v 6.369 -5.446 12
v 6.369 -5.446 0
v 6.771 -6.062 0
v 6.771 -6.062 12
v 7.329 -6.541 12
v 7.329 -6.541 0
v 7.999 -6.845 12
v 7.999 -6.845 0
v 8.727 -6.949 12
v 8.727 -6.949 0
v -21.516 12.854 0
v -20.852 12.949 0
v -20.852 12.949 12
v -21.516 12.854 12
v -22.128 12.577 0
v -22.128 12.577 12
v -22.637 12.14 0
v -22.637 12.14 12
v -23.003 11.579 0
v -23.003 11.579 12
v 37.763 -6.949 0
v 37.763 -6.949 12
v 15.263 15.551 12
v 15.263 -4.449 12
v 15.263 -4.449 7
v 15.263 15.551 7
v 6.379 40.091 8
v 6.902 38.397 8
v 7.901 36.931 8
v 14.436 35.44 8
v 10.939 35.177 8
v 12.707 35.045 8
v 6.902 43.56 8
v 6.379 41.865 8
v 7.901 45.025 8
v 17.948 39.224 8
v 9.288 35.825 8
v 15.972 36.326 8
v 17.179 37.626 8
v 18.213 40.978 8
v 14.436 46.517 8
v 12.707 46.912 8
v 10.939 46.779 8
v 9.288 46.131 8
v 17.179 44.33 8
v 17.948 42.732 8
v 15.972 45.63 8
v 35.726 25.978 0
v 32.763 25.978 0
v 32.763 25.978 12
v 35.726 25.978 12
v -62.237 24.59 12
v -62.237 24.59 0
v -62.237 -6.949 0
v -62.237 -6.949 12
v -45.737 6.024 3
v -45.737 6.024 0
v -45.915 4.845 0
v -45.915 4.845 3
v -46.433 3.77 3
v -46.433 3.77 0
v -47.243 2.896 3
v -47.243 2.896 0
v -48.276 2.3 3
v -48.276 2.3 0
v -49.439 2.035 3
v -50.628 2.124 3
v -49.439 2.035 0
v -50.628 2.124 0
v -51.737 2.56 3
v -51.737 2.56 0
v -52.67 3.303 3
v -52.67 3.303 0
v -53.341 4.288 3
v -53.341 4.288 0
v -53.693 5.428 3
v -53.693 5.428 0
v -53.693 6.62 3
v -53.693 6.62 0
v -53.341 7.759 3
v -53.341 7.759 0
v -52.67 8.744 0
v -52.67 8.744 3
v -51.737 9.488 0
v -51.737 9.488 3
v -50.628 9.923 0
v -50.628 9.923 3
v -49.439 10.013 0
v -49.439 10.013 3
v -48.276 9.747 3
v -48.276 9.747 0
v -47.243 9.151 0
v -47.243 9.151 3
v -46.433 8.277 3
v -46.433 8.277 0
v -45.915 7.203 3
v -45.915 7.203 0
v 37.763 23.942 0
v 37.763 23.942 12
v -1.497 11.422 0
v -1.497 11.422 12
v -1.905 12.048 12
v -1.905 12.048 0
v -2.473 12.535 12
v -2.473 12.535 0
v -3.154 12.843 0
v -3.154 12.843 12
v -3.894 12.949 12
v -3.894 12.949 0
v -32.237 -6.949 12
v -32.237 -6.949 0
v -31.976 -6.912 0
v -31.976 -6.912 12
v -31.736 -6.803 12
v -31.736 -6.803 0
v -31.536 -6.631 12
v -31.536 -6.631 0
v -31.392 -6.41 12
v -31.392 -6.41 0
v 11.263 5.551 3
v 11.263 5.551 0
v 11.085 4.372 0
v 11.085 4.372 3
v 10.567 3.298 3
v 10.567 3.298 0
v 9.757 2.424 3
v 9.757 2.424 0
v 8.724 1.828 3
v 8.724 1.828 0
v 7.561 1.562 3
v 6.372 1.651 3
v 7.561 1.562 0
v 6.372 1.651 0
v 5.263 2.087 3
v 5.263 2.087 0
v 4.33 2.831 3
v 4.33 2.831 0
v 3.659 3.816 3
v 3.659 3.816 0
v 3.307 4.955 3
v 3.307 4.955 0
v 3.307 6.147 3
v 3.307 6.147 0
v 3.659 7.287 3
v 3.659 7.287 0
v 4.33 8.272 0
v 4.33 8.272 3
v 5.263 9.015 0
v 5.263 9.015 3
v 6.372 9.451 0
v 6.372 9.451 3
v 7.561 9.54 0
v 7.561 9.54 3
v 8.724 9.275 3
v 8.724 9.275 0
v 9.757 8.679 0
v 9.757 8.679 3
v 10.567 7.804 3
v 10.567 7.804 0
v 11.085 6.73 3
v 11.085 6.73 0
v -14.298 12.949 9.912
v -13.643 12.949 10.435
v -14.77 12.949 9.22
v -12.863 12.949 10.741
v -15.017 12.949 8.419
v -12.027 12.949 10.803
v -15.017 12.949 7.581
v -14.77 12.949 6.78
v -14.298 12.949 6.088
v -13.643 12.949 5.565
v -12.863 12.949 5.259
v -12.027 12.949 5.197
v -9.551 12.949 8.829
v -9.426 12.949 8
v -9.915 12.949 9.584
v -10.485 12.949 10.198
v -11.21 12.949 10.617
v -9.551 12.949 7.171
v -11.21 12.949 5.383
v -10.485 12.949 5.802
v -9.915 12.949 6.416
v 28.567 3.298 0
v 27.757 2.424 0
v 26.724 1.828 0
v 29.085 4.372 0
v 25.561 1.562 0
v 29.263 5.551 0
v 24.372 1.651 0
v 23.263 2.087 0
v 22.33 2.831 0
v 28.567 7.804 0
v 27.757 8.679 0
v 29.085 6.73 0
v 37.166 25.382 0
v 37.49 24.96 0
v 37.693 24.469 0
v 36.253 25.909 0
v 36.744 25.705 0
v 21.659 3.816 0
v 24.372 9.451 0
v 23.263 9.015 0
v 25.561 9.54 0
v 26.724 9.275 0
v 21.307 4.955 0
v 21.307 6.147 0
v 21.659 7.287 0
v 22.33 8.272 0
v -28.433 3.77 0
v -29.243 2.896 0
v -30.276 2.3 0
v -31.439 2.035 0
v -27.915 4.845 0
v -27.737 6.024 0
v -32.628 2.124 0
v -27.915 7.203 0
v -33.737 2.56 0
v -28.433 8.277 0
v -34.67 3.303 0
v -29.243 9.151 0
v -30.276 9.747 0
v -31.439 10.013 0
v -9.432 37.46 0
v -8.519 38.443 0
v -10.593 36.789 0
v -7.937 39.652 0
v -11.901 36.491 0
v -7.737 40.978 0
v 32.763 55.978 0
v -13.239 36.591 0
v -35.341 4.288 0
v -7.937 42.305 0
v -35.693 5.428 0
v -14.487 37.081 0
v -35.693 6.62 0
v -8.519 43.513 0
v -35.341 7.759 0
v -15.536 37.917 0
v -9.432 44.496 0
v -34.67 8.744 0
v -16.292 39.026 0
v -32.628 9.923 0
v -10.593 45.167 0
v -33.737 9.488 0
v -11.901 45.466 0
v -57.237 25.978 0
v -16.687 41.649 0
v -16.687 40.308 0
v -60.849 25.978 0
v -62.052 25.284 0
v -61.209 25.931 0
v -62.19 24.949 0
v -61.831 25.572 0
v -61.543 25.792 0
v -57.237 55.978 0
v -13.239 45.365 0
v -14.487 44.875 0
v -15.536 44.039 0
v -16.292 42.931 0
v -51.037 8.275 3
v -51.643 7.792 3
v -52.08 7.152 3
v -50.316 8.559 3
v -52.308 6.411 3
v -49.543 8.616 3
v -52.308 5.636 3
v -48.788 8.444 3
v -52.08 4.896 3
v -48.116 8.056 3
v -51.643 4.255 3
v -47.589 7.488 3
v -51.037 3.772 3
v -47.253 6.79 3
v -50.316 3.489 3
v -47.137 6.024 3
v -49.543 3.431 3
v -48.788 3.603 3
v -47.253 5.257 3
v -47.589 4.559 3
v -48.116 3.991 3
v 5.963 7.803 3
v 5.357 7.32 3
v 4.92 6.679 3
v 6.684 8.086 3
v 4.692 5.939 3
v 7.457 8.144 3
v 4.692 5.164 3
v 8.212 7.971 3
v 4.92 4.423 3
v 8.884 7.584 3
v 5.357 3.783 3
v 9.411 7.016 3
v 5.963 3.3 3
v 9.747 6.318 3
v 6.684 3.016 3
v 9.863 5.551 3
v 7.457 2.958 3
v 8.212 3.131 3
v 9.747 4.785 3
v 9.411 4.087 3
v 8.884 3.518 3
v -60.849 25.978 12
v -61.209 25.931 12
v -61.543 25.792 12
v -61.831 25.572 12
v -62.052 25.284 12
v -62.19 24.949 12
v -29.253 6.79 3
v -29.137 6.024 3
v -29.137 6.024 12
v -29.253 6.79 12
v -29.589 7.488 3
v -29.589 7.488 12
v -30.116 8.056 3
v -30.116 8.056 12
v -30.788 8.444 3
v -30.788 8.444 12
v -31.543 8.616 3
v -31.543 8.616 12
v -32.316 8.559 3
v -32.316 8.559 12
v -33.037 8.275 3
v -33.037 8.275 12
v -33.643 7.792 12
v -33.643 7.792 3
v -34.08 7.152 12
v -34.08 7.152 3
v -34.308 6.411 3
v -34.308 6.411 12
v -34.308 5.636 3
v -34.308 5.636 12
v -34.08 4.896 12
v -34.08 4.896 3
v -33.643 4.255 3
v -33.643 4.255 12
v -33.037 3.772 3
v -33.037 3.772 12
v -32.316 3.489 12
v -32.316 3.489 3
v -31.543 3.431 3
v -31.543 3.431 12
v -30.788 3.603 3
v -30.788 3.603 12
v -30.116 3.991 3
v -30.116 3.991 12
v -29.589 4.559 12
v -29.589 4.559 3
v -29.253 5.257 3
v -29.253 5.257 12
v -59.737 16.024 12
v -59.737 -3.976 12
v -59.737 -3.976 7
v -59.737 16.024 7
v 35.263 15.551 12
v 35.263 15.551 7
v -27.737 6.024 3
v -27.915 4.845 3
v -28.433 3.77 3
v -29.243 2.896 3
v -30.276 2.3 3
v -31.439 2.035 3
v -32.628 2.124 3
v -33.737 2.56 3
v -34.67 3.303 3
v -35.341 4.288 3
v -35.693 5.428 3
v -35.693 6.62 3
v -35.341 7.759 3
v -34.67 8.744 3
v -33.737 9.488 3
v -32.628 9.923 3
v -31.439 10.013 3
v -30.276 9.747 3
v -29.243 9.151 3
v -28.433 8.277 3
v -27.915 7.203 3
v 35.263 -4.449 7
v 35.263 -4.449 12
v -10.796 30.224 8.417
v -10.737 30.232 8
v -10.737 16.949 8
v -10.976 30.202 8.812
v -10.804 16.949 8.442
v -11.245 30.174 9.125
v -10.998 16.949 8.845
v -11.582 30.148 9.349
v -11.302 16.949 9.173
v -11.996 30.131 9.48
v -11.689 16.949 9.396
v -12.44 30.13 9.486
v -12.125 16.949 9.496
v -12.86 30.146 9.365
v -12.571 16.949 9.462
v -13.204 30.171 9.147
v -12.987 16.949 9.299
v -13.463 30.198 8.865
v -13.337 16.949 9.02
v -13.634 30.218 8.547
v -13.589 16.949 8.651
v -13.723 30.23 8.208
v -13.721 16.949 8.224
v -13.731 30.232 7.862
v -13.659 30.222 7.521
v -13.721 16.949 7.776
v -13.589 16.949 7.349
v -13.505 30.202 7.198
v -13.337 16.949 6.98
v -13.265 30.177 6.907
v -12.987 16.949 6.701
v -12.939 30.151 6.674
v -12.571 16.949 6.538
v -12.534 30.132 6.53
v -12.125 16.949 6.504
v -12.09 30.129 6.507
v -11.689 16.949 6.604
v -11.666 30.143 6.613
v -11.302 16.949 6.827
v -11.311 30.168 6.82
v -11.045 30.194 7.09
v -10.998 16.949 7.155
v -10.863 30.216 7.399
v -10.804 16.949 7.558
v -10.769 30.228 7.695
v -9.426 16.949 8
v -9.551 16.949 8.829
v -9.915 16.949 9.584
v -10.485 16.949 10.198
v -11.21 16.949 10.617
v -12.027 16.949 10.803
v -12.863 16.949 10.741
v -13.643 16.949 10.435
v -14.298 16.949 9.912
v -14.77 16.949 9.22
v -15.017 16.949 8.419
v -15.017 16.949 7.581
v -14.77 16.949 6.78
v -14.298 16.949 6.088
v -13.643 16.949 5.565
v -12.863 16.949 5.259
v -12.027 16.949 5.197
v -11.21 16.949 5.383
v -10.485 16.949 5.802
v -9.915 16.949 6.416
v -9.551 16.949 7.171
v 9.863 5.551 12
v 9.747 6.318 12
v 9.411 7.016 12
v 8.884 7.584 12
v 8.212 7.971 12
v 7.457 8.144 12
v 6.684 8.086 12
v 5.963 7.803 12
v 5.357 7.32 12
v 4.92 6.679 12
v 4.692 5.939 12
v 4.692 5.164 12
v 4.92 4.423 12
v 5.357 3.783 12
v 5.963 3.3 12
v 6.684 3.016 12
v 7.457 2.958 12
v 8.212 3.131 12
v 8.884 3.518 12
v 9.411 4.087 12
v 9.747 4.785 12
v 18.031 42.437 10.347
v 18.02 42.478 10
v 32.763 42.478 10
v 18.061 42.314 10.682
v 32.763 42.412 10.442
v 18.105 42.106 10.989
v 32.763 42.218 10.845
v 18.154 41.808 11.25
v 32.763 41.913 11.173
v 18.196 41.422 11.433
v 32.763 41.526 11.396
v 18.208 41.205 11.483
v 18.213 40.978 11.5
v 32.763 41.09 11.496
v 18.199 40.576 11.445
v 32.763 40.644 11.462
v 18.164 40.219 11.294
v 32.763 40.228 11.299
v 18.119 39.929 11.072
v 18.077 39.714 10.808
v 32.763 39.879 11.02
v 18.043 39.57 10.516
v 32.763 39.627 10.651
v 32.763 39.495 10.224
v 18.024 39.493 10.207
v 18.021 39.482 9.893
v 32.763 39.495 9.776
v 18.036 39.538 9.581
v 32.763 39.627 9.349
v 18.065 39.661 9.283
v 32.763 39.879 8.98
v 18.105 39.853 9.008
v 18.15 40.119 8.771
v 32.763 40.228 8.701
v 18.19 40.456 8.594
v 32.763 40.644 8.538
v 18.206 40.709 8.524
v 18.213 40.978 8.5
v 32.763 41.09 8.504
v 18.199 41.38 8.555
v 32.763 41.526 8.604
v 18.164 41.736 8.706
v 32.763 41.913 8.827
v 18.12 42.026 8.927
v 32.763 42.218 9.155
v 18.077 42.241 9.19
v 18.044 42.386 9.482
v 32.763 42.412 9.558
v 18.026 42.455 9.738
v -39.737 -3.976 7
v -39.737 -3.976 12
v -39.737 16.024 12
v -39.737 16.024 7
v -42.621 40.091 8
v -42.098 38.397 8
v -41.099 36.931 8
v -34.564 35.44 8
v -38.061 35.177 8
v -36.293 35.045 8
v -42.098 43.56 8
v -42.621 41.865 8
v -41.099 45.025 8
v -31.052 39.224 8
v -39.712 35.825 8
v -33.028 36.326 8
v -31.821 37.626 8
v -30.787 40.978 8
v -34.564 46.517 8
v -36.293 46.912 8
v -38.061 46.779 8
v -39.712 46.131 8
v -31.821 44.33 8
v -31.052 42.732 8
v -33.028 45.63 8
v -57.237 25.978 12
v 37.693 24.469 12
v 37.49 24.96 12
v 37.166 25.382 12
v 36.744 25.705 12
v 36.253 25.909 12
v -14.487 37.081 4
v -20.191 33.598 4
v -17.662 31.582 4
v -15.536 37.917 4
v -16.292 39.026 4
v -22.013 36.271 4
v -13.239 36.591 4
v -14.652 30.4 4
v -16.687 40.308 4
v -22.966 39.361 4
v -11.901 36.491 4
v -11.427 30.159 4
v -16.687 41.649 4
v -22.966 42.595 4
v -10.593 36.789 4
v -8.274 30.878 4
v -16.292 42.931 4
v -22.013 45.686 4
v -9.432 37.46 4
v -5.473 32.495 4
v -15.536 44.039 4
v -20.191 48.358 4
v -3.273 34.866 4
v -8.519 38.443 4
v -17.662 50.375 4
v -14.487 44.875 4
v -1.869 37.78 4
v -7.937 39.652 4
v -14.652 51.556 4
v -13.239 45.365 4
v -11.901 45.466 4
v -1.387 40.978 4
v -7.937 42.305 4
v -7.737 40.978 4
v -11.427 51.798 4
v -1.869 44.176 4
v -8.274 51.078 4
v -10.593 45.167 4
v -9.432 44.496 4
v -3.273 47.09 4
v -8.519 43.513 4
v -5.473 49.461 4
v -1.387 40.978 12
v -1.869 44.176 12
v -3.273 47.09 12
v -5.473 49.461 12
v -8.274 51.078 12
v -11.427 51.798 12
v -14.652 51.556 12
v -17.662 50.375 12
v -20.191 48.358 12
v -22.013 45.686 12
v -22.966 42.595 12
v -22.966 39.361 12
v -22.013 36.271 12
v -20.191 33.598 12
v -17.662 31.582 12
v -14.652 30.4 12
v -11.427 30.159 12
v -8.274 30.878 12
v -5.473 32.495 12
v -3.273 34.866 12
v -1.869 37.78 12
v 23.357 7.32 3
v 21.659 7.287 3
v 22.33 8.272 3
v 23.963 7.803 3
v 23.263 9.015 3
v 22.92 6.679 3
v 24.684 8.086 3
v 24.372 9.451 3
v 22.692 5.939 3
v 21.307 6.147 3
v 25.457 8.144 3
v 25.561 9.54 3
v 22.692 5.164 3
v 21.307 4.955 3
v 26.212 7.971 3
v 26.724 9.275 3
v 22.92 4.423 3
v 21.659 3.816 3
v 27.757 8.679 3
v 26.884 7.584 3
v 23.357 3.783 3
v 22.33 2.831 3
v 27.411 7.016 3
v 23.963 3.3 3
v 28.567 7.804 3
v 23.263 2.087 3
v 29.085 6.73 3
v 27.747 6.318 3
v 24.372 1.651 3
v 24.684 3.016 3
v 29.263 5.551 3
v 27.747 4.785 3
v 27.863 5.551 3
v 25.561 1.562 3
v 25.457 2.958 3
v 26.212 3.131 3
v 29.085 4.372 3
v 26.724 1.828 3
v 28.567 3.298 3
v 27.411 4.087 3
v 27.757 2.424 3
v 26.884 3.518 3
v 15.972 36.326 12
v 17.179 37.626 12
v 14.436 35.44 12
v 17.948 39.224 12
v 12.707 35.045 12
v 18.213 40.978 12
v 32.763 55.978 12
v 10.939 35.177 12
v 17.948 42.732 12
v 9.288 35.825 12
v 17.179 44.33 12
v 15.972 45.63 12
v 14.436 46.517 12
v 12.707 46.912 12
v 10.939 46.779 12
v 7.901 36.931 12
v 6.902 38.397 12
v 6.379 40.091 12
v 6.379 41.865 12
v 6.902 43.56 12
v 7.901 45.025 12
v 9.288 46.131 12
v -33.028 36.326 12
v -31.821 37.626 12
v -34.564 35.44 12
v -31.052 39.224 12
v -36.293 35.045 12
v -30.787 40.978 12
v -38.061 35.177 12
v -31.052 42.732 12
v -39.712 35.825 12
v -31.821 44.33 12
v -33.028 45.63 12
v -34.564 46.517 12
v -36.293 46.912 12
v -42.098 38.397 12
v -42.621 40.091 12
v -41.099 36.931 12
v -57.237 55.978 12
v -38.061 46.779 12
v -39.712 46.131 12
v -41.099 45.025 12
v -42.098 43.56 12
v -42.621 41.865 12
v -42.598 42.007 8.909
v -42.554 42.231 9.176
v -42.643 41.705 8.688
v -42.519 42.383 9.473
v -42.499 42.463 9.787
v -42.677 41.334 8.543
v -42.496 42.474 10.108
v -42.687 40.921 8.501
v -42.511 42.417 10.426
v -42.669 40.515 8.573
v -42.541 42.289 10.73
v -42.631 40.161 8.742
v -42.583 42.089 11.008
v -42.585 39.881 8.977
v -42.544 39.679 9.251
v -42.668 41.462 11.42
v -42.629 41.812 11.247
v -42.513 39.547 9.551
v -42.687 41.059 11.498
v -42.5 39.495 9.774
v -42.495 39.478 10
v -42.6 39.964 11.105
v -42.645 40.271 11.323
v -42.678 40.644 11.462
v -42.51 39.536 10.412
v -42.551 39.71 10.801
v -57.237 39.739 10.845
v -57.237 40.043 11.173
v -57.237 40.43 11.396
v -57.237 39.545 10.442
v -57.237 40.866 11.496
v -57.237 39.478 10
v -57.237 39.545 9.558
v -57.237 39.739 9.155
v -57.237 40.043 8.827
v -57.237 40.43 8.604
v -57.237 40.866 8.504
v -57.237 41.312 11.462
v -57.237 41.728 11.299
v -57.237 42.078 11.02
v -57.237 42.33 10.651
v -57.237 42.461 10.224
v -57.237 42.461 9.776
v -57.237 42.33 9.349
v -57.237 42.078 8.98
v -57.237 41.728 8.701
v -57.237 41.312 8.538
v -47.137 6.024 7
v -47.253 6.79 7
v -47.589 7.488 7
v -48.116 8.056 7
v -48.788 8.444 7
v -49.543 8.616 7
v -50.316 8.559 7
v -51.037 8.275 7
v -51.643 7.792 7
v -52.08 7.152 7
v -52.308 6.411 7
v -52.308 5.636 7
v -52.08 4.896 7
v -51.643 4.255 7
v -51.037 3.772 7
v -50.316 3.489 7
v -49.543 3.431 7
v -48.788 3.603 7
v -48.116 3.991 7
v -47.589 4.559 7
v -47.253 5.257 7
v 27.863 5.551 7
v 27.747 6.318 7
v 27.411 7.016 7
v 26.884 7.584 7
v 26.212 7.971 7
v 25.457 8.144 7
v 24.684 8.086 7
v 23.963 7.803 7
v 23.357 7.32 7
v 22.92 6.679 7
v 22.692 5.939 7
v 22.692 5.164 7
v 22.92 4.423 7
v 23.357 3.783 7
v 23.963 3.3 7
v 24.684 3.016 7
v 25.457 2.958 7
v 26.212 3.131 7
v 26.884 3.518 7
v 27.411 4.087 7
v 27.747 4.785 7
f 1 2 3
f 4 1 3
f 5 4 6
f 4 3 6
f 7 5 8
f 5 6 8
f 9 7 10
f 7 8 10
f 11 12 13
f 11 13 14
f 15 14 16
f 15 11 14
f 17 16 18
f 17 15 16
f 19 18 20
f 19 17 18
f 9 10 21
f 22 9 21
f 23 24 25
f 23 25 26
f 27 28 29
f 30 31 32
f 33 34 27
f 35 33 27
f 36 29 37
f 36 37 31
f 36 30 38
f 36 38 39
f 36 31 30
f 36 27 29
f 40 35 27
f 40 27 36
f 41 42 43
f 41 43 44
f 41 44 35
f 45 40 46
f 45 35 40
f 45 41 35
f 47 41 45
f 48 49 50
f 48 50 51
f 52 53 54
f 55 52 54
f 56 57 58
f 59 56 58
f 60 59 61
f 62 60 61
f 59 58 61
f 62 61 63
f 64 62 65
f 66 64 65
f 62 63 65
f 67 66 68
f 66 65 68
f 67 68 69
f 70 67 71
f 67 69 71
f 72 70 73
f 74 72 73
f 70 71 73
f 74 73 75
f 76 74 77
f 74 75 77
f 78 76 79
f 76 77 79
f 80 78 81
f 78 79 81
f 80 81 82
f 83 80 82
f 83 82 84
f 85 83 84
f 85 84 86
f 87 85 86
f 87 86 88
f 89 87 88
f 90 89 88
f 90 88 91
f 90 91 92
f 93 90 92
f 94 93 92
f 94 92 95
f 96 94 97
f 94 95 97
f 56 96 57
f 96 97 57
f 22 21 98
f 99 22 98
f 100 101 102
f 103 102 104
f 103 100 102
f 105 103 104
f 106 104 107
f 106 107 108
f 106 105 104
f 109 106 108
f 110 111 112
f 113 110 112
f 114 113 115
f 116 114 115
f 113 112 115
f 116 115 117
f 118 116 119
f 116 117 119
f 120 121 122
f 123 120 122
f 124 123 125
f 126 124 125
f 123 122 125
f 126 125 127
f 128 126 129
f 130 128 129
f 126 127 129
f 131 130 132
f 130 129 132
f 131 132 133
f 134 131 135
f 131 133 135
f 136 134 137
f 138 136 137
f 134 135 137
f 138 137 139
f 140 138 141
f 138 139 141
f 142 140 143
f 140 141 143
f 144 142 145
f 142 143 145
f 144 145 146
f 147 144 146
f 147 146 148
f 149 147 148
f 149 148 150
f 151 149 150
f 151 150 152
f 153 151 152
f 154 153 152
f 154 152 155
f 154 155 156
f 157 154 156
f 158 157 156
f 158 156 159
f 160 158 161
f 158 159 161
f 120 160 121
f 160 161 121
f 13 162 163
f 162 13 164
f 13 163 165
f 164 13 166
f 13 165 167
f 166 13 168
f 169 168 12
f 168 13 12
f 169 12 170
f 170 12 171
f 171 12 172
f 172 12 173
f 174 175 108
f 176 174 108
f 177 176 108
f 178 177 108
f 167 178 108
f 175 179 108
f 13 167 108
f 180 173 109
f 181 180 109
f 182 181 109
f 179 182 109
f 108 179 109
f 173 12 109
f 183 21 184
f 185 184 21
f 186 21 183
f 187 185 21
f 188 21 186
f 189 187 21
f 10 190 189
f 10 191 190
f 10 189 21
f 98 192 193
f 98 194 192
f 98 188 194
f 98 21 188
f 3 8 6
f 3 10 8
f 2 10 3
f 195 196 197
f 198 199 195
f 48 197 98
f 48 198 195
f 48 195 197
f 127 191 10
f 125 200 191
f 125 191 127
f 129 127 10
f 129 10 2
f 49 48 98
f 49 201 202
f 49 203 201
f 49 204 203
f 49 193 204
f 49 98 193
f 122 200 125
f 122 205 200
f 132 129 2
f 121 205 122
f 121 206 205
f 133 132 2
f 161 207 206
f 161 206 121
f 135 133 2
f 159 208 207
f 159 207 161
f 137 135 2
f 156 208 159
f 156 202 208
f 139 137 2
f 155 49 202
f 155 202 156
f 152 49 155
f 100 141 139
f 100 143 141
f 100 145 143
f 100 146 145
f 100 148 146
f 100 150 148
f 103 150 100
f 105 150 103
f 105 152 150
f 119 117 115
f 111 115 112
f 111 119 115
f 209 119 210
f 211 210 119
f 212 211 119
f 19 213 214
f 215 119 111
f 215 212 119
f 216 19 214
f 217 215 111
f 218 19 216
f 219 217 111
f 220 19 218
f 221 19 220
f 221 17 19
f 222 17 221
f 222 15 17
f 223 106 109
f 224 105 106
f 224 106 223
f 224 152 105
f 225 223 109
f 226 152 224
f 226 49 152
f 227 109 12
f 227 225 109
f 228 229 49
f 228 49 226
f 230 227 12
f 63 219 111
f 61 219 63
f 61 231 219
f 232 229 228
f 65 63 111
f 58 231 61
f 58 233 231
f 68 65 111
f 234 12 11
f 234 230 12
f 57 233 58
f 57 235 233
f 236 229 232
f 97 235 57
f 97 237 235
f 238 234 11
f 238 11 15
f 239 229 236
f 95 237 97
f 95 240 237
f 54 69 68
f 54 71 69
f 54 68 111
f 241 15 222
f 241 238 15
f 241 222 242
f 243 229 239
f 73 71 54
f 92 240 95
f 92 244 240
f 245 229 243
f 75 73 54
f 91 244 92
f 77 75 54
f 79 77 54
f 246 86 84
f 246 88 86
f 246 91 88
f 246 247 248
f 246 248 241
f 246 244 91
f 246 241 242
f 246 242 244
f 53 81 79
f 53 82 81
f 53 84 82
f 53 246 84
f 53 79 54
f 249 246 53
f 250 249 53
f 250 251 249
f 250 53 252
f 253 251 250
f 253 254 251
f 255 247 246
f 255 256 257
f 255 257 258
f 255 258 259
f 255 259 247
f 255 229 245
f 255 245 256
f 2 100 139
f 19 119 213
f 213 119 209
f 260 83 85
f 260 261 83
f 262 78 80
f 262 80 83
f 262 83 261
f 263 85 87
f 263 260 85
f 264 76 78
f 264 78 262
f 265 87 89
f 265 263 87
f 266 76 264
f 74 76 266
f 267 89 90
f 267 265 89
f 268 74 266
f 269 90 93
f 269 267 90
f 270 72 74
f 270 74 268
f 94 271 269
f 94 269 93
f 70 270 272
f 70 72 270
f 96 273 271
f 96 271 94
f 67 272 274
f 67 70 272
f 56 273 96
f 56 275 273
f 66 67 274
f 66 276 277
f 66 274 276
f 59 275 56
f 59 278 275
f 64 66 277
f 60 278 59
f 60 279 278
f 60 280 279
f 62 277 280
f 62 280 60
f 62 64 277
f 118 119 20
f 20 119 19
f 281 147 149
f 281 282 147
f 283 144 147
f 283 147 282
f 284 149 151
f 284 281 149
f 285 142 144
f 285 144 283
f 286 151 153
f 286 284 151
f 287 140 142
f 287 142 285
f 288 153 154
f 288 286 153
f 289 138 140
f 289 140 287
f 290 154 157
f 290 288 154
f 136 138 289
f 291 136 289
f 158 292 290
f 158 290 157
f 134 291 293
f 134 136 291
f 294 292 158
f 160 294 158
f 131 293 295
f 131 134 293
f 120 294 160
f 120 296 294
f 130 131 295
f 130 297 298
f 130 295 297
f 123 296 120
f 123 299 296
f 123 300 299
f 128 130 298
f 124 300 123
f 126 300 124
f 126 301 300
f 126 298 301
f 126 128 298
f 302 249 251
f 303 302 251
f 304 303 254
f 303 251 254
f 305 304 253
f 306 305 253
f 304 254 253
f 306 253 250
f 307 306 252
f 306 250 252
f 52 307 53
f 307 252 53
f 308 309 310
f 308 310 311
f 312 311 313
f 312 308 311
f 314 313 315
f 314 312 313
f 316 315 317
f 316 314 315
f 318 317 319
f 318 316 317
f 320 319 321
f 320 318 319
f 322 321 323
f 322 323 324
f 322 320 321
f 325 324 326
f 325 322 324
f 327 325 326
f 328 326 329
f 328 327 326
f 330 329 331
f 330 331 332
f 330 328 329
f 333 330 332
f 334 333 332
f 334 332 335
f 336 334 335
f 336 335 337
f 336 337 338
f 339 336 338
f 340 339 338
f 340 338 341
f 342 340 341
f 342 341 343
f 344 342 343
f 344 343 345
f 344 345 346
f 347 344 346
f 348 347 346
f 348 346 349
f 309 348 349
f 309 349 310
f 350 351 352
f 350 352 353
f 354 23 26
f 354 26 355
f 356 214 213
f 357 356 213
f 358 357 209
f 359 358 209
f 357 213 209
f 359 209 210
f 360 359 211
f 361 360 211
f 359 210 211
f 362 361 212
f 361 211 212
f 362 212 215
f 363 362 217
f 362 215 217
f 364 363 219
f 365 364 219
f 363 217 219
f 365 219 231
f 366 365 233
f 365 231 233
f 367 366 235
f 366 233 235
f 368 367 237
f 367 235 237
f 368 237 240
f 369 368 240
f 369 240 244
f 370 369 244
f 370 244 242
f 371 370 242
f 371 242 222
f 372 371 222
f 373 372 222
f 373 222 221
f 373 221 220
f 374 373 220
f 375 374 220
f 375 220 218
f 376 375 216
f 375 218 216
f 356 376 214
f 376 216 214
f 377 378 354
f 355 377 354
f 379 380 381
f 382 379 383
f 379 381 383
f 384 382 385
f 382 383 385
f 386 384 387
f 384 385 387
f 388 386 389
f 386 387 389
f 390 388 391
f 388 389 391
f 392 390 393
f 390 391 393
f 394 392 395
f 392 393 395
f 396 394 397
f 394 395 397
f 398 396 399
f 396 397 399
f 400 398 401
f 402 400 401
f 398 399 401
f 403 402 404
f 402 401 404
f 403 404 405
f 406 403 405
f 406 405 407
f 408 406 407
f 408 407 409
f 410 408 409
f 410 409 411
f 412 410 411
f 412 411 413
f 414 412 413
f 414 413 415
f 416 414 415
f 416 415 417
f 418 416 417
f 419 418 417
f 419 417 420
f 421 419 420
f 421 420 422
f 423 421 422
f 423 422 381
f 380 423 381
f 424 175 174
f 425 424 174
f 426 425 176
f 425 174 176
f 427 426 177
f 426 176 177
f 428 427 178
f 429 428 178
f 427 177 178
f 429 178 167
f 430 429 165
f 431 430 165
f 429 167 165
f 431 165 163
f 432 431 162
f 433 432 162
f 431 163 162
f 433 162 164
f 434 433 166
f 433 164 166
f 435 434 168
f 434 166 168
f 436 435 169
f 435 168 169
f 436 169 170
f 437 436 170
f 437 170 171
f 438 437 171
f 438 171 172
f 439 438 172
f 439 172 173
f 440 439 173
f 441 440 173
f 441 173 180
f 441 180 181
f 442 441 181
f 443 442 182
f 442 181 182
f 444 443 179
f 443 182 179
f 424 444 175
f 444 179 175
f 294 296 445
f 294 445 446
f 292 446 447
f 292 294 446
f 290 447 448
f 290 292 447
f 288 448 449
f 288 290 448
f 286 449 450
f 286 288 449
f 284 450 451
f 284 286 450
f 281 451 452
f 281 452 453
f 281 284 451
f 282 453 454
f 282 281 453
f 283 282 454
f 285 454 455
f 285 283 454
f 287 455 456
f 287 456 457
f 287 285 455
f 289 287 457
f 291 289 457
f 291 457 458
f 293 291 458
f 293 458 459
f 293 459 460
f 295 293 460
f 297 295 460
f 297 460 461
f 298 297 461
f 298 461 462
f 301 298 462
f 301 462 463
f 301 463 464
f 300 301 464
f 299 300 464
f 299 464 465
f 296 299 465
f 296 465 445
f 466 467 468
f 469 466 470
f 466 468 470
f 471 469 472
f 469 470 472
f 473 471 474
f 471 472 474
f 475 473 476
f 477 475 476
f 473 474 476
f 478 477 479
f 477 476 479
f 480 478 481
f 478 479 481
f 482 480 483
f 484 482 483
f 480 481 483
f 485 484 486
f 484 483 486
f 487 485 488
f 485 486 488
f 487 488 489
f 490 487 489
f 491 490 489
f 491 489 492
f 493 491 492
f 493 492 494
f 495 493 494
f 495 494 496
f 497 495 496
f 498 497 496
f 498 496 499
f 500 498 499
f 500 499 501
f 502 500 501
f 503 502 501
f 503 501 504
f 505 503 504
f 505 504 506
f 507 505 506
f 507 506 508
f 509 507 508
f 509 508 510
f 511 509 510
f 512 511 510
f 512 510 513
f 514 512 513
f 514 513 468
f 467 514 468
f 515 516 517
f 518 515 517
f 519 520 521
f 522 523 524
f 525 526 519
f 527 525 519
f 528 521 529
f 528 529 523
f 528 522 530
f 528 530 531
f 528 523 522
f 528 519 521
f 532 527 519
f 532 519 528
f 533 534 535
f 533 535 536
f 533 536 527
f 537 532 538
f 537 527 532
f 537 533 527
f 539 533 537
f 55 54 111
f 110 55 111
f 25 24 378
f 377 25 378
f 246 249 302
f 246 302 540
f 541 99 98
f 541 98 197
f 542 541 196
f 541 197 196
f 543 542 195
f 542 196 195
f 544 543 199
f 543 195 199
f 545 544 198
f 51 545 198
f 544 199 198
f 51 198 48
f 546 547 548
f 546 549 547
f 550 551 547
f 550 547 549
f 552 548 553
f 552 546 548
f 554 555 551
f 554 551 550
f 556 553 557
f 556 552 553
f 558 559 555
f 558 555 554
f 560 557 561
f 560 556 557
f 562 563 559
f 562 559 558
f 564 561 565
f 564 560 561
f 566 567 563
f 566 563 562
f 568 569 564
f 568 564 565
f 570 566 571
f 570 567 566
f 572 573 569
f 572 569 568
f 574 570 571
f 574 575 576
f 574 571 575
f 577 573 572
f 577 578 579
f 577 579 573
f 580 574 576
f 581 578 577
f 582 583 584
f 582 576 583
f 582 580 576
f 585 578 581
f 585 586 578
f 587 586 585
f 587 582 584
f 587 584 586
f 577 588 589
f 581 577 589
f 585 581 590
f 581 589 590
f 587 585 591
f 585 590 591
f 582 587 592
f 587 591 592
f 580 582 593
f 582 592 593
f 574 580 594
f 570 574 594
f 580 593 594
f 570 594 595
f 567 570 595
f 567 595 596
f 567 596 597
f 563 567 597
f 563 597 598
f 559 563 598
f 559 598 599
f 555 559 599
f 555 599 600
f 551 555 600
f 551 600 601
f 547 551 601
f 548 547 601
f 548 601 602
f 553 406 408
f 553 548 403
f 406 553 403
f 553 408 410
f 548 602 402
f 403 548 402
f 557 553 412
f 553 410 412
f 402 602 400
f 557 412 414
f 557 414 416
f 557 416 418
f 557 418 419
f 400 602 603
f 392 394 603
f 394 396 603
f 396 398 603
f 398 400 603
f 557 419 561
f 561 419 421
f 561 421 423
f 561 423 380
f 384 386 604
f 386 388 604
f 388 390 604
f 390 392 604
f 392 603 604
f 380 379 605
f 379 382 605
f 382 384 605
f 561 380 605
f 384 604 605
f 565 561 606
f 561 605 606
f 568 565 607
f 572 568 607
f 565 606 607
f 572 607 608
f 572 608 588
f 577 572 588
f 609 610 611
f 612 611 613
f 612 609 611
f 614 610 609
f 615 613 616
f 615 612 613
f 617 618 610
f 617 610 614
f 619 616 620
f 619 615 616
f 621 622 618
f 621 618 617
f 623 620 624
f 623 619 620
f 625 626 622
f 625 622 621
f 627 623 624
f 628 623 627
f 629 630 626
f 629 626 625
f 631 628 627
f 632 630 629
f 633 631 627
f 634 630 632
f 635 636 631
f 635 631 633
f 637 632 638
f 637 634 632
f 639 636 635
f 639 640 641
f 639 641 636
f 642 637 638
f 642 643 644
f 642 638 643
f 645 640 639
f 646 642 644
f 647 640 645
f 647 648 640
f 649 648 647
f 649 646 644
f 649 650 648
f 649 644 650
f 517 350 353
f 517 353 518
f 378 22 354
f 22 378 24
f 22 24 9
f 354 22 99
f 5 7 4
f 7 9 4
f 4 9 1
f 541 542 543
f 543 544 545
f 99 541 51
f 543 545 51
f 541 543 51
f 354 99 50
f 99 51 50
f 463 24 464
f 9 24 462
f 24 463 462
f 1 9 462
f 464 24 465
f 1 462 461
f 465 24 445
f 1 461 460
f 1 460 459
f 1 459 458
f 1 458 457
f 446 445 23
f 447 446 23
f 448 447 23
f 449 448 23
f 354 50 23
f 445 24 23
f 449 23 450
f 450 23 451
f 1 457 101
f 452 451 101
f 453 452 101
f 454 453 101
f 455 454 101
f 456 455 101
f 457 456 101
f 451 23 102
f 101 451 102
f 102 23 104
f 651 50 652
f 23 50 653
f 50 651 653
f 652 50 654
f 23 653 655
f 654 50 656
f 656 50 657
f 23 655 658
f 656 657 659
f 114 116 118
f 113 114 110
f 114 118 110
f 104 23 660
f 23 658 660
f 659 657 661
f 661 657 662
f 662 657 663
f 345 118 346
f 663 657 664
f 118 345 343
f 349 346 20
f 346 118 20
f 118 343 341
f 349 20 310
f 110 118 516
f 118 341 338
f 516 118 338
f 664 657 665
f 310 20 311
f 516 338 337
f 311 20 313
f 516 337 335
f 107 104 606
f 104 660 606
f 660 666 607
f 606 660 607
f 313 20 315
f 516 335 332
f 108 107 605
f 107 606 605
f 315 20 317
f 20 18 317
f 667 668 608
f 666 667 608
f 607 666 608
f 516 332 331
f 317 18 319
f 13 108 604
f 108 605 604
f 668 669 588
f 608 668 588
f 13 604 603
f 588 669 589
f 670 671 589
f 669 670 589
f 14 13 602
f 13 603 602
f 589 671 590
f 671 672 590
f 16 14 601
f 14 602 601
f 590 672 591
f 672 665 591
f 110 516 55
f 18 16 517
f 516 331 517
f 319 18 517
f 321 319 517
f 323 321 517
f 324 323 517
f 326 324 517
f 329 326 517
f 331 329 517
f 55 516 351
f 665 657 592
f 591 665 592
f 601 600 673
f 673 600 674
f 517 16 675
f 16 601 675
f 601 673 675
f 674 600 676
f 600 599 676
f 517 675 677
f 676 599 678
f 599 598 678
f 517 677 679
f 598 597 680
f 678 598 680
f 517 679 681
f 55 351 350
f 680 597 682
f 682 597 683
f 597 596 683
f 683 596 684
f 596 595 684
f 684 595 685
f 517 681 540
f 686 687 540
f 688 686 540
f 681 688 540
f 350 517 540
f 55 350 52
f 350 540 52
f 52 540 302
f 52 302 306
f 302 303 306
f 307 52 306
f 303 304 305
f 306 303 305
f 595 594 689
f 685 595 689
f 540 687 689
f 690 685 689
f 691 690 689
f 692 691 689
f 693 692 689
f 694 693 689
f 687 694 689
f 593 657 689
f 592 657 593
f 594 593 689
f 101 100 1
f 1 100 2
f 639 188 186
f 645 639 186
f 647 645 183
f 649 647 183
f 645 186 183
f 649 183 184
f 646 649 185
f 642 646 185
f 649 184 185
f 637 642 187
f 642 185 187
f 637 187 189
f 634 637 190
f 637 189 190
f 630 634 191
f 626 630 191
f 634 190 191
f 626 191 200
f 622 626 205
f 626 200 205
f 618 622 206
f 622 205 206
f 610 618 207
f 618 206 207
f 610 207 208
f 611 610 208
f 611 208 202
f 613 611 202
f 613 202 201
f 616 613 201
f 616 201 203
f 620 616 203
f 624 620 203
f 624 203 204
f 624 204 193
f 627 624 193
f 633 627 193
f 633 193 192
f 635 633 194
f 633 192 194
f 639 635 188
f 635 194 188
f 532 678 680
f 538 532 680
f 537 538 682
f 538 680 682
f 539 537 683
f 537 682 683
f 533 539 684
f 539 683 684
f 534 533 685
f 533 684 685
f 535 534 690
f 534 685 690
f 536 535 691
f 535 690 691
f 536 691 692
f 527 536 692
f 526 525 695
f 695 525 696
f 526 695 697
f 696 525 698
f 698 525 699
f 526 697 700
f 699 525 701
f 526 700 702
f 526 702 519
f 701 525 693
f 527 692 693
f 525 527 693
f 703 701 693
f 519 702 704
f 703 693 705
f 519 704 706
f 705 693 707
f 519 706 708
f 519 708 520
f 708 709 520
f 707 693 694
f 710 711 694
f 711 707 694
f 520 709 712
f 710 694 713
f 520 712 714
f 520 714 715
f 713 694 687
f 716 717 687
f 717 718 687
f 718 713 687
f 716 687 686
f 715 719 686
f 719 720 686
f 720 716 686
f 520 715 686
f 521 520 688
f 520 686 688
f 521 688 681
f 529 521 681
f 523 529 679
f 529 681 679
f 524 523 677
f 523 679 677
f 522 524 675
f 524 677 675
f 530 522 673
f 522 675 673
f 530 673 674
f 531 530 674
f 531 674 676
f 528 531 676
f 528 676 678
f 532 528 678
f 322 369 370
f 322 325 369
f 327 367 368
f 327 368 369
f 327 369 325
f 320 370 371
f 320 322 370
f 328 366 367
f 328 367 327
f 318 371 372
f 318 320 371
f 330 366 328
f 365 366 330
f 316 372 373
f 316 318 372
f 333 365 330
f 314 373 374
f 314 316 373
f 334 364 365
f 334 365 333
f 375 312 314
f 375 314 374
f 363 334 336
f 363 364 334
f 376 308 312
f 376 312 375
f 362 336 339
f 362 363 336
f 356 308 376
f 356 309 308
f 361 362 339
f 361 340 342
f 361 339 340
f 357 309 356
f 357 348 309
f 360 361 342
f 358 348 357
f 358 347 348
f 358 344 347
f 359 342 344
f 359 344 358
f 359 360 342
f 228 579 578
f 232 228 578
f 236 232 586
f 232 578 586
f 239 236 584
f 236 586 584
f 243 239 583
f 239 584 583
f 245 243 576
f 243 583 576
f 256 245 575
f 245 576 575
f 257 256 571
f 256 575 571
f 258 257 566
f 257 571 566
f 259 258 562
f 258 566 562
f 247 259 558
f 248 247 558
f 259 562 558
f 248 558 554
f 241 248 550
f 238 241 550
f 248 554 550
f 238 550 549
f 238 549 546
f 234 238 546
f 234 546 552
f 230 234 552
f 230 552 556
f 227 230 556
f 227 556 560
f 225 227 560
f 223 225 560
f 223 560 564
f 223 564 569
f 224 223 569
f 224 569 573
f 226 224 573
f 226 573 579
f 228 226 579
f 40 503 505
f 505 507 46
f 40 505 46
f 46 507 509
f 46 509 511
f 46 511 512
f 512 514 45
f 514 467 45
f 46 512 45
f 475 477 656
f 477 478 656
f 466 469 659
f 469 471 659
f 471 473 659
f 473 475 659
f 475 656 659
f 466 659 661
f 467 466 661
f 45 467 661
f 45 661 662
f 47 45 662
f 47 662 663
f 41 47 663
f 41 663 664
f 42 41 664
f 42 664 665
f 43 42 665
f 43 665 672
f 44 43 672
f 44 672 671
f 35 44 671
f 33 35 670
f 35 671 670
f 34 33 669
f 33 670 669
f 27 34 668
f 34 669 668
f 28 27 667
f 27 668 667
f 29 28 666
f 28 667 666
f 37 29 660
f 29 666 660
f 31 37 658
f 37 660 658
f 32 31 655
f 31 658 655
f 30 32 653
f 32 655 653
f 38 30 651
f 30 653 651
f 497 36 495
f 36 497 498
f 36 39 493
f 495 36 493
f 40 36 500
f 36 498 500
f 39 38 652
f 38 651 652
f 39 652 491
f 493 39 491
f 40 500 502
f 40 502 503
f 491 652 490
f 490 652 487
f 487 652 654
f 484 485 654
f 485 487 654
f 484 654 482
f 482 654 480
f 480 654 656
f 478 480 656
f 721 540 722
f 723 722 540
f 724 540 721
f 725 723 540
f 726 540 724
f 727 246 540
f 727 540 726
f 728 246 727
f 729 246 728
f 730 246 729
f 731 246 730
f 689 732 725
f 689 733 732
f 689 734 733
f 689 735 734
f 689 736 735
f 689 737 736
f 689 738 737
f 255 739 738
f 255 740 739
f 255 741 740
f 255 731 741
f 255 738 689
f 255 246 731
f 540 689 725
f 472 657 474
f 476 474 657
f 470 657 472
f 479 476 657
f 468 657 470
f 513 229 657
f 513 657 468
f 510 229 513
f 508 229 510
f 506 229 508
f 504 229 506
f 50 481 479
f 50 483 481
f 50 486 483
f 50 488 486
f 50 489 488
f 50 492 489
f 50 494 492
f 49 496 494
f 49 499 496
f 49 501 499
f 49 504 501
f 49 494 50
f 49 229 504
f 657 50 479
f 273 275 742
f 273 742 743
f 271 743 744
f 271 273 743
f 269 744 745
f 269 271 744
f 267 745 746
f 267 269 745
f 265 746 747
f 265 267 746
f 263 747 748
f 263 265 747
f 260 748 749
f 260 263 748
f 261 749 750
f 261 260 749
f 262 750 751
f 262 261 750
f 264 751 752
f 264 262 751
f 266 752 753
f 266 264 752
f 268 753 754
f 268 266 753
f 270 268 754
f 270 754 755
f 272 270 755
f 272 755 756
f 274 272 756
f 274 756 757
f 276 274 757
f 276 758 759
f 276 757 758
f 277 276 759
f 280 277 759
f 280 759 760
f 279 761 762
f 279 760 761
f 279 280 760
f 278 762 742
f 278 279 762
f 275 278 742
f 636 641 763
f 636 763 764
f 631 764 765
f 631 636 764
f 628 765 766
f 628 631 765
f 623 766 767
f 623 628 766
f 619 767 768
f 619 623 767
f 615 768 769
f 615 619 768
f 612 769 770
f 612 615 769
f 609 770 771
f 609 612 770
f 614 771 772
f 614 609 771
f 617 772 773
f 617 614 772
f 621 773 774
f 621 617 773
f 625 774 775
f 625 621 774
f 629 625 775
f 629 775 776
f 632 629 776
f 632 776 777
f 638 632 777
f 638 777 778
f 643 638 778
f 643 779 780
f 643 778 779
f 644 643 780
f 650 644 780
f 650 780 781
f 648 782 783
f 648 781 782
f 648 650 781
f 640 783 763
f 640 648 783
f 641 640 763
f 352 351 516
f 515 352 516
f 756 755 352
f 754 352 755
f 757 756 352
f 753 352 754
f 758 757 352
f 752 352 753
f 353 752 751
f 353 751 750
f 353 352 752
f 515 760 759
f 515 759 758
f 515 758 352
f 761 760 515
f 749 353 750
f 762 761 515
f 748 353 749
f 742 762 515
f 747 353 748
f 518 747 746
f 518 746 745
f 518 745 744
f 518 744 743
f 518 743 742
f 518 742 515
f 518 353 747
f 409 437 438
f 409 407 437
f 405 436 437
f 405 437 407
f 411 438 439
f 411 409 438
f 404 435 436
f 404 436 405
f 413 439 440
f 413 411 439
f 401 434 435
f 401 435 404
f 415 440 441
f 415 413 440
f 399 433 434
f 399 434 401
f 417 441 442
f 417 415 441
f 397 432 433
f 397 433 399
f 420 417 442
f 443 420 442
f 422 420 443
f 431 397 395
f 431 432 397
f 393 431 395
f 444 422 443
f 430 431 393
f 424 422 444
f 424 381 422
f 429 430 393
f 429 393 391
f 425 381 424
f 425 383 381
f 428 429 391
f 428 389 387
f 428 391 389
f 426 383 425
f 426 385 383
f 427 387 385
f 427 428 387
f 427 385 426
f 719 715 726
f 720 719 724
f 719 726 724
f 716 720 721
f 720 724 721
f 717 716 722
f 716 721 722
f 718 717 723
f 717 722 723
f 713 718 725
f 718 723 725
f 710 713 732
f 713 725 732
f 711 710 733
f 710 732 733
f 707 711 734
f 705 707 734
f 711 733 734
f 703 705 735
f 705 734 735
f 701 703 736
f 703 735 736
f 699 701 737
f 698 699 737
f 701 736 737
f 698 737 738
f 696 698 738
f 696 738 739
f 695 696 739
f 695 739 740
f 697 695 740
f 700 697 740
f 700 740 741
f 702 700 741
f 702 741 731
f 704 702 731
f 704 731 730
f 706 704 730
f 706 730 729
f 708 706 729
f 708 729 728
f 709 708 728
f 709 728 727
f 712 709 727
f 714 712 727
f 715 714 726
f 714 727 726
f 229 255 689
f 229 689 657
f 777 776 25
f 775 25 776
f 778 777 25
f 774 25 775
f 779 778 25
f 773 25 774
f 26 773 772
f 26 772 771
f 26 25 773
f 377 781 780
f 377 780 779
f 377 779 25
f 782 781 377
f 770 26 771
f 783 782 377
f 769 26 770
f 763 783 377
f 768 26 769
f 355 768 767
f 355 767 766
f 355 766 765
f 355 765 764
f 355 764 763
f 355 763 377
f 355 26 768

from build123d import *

# Parameters (mm, degrees)
SKETCH_R        = 2.6
PAD_DEPTH       = 12
SKETCH001_W     = 20
SKETCH001_H     = 20
POCKET_DEPTH    = 5
SKETCH002_R     = 4.5
POCKET001_DEPTH = 12
SKETCH003_R     = 10.85
POCKET002_DEPTH = 8
SKETCH004_R     = 5.95
POCKET003_DEPTH = 4
SKETCH005_R     = 1.5
POCKET004_DEPTH = 19
SKETCH006_R     = 2.811214
POCKET005_DEPTH = 4
SKETCH007_R     = 4
POCKET006_DEPTH = 3
SKETCH008_R     = 1.5
POCKET007_DEPTH = 16
SKETCH009_R     = 1.5
POCKET008_DEPTH = 16


with BuildPart() as part:
    # Sketch → Pad (new body)
    with BuildSketch(Plane.XY):
        with BuildLine():
            Line((-57.237457, 55.978201), (32.762543, 55.978201))
            Line((32.762543, 55.978201), (32.762543, 25.978201))
            Line((32.762543, 25.978201), (35.725993, 25.978201))
            ThreePointArc((37.762543, 23.941651), (37.166051, 25.381709), (35.725993, 25.978201))
            Line((37.762543, 23.941651), (37.762543, 20.978201))
            Line((37.762543, -6.948806), (37.762543, 20.978201))
            Line((8.727398, -6.948806), (37.762543, -6.948806))
            ThreePointArc((6.368817, -5.446224), (7.329126, -6.541247), (8.727398, -6.948806))
            Line((-1.496911, 11.421883), (6.368817, -5.446224))
            ThreePointArc((-1.496911, 11.421883), (-2.47295, 12.534842), (-3.894125, 12.949077))
            Line((-20.852174, 12.949077), (-3.894125, 12.949077))
            ThreePointArc((-20.852174, 12.949077), (-22.12751, 12.577351), (-23.003388, 11.578602))
            Line((-31.391573, -6.409918), (-23.003388, 11.578602))
            ThreePointArc((-32.237457, -6.948806), (-31.73598, -6.802638), (-31.391573, -6.409918))
            Line((-62.237457, -6.948806), (-32.237457, -6.948806))
            Line((-62.237457, 17.407665), (-62.237457, -6.948806))
            Line((-62.237457, 17.407665), (-62.237457, 24.590235))
            ThreePointArc((-60.849491, 25.978201), (-61.830931, 25.571675), (-62.237457, 24.590235))
            Line((-60.849491, 25.978201), (-57.237457, 25.978201))
            Line((-57.237457, 25.978201), (-57.237457, 55.978201))
        make_face()
        with Locations((-49.737457, 6.02373)):
            Circle(SKETCH_R, mode=Mode.SUBTRACT)
        with Locations((-31.737457, 6.02373)):
            Circle(SKETCH_R, mode=Mode.SUBTRACT)
        with Locations((25.262543, 5.551194)):
            Circle(SKETCH_R, mode=Mode.SUBTRACT)
        with Locations((7.262543, 5.551194)):
            Circle(SKETCH_R, mode=Mode.SUBTRACT)
    extrude(amount=PAD_DEPTH)

    # Sketch001 (on Face26 of Pad) → Pocket (cut)
    with BuildSketch(Plane.XY.offset(12)):
        with Locations((-49.737457, 6.02373)):
            Rectangle(SKETCH001_W, SKETCH001_H)
        with Locations((25.262543, 5.551194)):
            Rectangle(SKETCH001_W, SKETCH001_H)
    extrude(amount=-POCKET_DEPTH, mode=Mode.SUBTRACT)

    # Sketch002 (on Face5 of Pocket) → Pocket001 (cut)
    with BuildSketch(Plane.XY.offset(12)):
        with Locations((-12.237457, 40.978201)):
            Circle(SKETCH002_R)
    extrude(amount=-POCKET001_DEPTH, mode=Mode.SUBTRACT)

    # Sketch003 (on Face5 of Pocket001) → Pocket002 (cut)
    with BuildSketch(Plane.XY.offset(12)):
        with Locations((-12.237457, 40.978201)):
            Circle(SKETCH003_R)
    extrude(amount=-POCKET002_DEPTH, mode=Mode.SUBTRACT)

    # Sketch004 (on Face5 of Pocket002) → Pocket003 (cut)
    with BuildSketch(Plane.XY.offset(12)):
        with Locations((-36.737457, 40.978201)):
            Circle(SKETCH004_R)
        with Locations((12.262543, 40.978201)):
            Circle(SKETCH004_R)
    extrude(amount=-POCKET003_DEPTH, mode=Mode.SUBTRACT)

    # Sketch005 (on Face18 of Pocket003) → Pocket004 (cut)
    with BuildSketch(Plane.XZ.offset(-12.949077)):
        with Locations((-12.237457, 8)):
            Circle(SKETCH005_R)
    extrude(amount=-POCKET004_DEPTH, mode=Mode.SUBTRACT)

    # Sketch006 (on Face18 of Pocket004) → Pocket005 (cut)
    with BuildSketch(Plane.XZ.offset(-12.949077)):
        with Locations((-12.237457, 8)):
            Circle(SKETCH006_R)
    extrude(amount=-POCKET005_DEPTH, mode=Mode.SUBTRACT)

    # Sketch007 (on Face4 of Pocket005) → Pocket006 (cut)
    with BuildSketch(Plane(origin=(0, 0, 0), x_dir=(1, 0, 0), z_dir=(0, 0, -1))):
        with Locations((-49.737457, -6.02373)):
            Circle(SKETCH007_R)
        with Locations((-31.737457, -6.02373)):
            Circle(SKETCH007_R)
        with Locations((7.262543, -5.551194)):
            Circle(SKETCH007_R)
        with Locations((25.262543, -5.551194)):
            Circle(SKETCH007_R)
    extrude(amount=-POCKET006_DEPTH, mode=Mode.SUBTRACT)

    # Sketch008 (on Face9 of Pocket006) → Pocket007 (cut)
    with BuildSketch(Plane.YZ.offset(32.762543)):
        with Locations((40.978201, 10)):
            Circle(SKETCH008_R)
    extrude(amount=-POCKET007_DEPTH, mode=Mode.SUBTRACT)

    # Sketch009 (on Face3 of Pocket007) → Pocket008 (cut)
    with BuildSketch(Plane(origin=(-57.237457, 0, 0), x_dir=(0, -1, 0), z_dir=(-1, 0, 0))):
        with Locations((-40.978201, 10)):
            Circle(SKETCH009_R)
    extrude(amount=-POCKET008_DEPTH, mode=Mode.SUBTRACT)


solid = part.part
